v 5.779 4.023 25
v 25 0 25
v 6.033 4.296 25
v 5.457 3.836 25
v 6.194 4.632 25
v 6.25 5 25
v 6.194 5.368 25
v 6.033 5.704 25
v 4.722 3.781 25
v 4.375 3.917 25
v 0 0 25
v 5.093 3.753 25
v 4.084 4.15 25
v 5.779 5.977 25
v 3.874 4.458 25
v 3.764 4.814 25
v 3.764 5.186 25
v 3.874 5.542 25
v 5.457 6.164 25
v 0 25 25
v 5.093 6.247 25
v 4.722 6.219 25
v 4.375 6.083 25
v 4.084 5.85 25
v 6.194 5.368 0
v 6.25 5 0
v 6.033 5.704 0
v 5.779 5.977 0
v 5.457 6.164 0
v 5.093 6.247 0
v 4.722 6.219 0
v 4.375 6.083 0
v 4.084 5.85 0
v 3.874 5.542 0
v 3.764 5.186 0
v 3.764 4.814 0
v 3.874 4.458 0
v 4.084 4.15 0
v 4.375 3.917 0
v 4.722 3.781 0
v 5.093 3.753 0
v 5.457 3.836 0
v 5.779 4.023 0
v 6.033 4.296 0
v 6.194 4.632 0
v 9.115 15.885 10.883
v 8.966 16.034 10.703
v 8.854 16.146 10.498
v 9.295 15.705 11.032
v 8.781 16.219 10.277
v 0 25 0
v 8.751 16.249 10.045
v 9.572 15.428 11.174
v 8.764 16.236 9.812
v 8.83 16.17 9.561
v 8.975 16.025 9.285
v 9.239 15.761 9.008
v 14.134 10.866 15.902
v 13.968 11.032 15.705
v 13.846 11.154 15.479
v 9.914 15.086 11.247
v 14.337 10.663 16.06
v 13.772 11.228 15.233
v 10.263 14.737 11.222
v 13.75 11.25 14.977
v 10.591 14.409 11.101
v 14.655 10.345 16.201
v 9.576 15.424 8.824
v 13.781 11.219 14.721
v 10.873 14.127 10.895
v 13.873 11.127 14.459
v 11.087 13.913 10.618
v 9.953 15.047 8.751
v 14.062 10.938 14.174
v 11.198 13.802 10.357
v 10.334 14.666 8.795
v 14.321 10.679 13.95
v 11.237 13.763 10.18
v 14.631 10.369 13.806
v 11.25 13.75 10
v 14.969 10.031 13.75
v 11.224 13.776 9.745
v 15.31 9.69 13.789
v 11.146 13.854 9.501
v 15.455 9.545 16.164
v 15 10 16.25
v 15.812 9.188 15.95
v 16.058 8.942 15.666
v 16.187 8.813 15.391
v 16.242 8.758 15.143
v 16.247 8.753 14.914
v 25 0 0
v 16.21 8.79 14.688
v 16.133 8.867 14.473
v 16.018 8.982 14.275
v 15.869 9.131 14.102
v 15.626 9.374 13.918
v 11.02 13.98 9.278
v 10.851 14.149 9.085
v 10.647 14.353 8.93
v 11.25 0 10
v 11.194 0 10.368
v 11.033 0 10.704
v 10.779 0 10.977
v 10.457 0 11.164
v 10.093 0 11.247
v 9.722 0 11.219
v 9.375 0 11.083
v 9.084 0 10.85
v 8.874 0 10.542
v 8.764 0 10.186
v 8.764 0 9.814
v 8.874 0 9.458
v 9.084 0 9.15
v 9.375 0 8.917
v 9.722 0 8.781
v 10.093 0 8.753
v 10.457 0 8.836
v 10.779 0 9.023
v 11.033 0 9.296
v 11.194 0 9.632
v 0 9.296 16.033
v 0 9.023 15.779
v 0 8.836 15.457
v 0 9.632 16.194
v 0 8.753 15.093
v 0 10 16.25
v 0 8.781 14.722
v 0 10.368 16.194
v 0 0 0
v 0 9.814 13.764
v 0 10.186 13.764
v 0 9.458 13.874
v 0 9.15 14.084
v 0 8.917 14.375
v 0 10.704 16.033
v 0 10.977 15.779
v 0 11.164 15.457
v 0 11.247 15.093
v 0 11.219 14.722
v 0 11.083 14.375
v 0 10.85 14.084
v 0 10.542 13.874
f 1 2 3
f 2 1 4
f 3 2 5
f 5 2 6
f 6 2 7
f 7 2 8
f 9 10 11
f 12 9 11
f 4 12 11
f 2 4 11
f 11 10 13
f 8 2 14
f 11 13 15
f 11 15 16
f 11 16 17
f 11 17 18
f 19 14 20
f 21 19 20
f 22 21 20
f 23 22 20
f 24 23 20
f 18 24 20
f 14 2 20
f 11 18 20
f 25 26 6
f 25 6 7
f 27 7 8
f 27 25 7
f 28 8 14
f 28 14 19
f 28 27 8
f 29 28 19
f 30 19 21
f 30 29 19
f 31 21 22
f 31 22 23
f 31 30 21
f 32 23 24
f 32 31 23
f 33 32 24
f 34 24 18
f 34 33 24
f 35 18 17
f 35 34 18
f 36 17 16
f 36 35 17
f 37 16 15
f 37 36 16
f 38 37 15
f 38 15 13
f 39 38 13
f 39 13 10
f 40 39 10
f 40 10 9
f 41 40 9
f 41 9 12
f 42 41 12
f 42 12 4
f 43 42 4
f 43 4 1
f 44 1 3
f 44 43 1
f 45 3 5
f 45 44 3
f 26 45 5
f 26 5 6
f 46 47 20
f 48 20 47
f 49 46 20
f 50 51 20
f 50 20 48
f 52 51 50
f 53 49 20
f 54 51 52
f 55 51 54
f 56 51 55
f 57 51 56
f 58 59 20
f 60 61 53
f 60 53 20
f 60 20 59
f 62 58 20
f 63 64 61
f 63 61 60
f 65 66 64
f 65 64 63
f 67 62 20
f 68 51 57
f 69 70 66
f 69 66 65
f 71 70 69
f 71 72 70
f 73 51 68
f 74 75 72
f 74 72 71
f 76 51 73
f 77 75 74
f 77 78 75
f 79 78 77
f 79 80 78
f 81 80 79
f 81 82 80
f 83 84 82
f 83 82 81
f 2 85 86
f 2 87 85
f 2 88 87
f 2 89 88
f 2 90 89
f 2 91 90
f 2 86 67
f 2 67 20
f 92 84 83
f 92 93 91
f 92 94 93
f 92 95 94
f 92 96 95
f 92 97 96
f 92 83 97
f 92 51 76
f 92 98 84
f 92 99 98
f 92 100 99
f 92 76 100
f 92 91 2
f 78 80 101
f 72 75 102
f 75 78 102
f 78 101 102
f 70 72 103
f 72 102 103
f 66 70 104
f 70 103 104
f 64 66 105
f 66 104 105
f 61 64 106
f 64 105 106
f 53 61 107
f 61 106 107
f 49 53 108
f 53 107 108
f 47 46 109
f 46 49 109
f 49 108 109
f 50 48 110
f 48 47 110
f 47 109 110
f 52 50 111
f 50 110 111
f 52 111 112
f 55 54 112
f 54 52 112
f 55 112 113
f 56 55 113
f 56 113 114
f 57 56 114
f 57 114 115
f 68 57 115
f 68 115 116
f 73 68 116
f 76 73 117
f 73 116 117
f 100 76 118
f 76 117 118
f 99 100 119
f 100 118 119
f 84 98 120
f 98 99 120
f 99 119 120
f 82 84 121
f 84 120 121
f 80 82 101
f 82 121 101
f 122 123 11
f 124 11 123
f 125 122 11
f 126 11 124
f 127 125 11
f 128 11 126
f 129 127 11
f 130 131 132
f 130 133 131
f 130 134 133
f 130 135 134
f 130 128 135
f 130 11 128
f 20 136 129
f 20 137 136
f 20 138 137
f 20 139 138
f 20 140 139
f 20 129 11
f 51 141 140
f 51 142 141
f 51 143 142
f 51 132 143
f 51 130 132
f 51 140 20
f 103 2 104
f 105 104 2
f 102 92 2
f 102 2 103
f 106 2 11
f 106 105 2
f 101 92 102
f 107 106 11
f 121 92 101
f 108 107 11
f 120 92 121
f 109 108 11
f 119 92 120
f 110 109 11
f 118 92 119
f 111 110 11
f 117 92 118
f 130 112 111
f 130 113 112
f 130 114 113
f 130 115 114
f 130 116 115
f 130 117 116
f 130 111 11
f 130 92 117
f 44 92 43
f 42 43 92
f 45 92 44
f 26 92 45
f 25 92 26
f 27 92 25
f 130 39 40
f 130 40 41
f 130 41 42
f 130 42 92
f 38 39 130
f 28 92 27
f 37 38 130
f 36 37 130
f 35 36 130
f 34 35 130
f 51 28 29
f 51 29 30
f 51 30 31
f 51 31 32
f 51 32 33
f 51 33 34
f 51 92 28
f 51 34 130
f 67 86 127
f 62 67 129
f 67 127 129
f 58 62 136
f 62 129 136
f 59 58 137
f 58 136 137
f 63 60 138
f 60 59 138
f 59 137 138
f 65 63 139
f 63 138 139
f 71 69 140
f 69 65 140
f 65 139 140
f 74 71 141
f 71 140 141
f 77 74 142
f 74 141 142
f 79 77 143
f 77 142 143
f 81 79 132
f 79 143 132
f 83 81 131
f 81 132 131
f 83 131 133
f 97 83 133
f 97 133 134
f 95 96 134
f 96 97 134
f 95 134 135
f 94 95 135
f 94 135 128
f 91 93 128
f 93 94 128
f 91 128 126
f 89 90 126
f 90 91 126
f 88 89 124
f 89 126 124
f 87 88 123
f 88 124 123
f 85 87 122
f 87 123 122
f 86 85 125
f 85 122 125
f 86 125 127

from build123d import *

# Parameters (mm, degrees)
SKETCH_1_R          = 1.25
EXTRUDE_1_DEPTH     = 25
SKETCH_2_R          = 1.25
CUT_EXTRUDE_1_DEPTH = 25
SKETCH_3_R          = 1.25
CUT_EXTRUDE_2_DEPTH = 25


with BuildPart() as part:
    # Эскиз1 → Бобышка-Вытянуть1 (new body)
    with BuildSketch(Plane.XY):
        Polygon((0, 0), (0, 25), (25, 0), align=None)
        with Locations((5, 5)):
            Circle(SKETCH_1_R, mode=Mode.SUBTRACT)
    extrude(amount=EXTRUDE_1_DEPTH)

    # Эскиз2 → Вырез-Вытянуть1 (cut)
    with BuildSketch(Plane.ZY):
        with Locations((15, 10)):
            Circle(SKETCH_2_R)
    extrude(amount=-CUT_EXTRUDE_1_DEPTH, mode=Mode.SUBTRACT)

    # Эскиз3 → Вырез-Вытянуть2 (cut)
    with BuildSketch(Plane.XZ):
        with Locations((10, 10)):
            Circle(SKETCH_3_R)
    extrude(amount=-CUT_EXTRUDE_2_DEPTH, mode=Mode.SUBTRACT)


solid = part.part
